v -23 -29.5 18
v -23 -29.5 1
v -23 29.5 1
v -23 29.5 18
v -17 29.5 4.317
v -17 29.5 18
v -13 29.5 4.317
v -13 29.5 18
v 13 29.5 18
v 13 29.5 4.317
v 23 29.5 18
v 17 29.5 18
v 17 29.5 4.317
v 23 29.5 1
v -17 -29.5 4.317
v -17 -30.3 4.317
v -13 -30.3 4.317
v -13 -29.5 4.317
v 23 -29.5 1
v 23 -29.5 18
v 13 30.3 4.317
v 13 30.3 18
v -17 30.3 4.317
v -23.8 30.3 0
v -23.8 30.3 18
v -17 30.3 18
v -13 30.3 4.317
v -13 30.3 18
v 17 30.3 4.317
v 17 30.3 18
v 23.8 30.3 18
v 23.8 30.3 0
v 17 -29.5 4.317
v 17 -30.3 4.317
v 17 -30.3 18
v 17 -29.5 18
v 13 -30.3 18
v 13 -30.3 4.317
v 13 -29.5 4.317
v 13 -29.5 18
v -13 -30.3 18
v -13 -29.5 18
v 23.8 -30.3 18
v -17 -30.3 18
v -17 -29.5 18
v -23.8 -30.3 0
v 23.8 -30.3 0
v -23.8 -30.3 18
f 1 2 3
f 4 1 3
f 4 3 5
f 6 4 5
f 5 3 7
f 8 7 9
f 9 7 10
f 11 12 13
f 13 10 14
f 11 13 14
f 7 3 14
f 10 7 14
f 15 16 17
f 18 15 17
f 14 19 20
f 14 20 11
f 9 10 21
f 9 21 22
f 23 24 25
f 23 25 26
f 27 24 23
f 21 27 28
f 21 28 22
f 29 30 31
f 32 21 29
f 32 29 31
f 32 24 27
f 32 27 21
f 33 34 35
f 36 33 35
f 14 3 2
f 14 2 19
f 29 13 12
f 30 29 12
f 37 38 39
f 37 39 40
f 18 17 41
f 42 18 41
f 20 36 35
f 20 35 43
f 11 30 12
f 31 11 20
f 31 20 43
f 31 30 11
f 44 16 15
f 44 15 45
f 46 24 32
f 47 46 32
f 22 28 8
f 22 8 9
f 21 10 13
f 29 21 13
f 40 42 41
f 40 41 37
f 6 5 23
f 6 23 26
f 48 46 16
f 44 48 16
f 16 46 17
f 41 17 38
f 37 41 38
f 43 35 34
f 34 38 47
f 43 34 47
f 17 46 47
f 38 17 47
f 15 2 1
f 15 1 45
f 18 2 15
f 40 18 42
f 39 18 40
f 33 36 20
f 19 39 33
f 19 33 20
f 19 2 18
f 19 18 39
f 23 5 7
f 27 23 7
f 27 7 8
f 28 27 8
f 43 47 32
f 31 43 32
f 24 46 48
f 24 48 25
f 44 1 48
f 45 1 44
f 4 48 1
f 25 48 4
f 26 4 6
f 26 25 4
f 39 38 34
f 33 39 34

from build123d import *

# Parameters (mm, degrees)
F0_W     = 46
F0_H     = 59
F1_DEPTH = 1
F0_W_2   = 47.6
F0_H_2   = 60.6
F2_DEPTH = 18
F3_W     = 4
F3_H     = 13.6829850562
F4_DEPTH = 100


with BuildPart() as f1:
    # F0 (on Top) → F1 (new body)
    with BuildSketch(Plane.XY):
        Rectangle(F0_W, F0_H)
    extrude(amount=F1_DEPTH)

    # F0 (on Top) → F2 (join)
    with BuildSketch(Plane.XY):
        Rectangle(F0_W_2, F0_H_2)
        Rectangle(F0_W, F0_H, mode=Mode.SUBTRACT)
    extrude(amount=F2_DEPTH)

    # F3 (on face) → F4 (cut)
    with BuildSketch(Plane.XZ.offset(30.3)):
        with Locations((-15, 11.1585074719)):
            Rectangle(F3_W, F3_H)
        with Locations((15, 11.1585074719)):
            Rectangle(F3_W, F3_H)
    extrude(amount=-F4_DEPTH, mode=Mode.SUBTRACT)


solid = f1.part
